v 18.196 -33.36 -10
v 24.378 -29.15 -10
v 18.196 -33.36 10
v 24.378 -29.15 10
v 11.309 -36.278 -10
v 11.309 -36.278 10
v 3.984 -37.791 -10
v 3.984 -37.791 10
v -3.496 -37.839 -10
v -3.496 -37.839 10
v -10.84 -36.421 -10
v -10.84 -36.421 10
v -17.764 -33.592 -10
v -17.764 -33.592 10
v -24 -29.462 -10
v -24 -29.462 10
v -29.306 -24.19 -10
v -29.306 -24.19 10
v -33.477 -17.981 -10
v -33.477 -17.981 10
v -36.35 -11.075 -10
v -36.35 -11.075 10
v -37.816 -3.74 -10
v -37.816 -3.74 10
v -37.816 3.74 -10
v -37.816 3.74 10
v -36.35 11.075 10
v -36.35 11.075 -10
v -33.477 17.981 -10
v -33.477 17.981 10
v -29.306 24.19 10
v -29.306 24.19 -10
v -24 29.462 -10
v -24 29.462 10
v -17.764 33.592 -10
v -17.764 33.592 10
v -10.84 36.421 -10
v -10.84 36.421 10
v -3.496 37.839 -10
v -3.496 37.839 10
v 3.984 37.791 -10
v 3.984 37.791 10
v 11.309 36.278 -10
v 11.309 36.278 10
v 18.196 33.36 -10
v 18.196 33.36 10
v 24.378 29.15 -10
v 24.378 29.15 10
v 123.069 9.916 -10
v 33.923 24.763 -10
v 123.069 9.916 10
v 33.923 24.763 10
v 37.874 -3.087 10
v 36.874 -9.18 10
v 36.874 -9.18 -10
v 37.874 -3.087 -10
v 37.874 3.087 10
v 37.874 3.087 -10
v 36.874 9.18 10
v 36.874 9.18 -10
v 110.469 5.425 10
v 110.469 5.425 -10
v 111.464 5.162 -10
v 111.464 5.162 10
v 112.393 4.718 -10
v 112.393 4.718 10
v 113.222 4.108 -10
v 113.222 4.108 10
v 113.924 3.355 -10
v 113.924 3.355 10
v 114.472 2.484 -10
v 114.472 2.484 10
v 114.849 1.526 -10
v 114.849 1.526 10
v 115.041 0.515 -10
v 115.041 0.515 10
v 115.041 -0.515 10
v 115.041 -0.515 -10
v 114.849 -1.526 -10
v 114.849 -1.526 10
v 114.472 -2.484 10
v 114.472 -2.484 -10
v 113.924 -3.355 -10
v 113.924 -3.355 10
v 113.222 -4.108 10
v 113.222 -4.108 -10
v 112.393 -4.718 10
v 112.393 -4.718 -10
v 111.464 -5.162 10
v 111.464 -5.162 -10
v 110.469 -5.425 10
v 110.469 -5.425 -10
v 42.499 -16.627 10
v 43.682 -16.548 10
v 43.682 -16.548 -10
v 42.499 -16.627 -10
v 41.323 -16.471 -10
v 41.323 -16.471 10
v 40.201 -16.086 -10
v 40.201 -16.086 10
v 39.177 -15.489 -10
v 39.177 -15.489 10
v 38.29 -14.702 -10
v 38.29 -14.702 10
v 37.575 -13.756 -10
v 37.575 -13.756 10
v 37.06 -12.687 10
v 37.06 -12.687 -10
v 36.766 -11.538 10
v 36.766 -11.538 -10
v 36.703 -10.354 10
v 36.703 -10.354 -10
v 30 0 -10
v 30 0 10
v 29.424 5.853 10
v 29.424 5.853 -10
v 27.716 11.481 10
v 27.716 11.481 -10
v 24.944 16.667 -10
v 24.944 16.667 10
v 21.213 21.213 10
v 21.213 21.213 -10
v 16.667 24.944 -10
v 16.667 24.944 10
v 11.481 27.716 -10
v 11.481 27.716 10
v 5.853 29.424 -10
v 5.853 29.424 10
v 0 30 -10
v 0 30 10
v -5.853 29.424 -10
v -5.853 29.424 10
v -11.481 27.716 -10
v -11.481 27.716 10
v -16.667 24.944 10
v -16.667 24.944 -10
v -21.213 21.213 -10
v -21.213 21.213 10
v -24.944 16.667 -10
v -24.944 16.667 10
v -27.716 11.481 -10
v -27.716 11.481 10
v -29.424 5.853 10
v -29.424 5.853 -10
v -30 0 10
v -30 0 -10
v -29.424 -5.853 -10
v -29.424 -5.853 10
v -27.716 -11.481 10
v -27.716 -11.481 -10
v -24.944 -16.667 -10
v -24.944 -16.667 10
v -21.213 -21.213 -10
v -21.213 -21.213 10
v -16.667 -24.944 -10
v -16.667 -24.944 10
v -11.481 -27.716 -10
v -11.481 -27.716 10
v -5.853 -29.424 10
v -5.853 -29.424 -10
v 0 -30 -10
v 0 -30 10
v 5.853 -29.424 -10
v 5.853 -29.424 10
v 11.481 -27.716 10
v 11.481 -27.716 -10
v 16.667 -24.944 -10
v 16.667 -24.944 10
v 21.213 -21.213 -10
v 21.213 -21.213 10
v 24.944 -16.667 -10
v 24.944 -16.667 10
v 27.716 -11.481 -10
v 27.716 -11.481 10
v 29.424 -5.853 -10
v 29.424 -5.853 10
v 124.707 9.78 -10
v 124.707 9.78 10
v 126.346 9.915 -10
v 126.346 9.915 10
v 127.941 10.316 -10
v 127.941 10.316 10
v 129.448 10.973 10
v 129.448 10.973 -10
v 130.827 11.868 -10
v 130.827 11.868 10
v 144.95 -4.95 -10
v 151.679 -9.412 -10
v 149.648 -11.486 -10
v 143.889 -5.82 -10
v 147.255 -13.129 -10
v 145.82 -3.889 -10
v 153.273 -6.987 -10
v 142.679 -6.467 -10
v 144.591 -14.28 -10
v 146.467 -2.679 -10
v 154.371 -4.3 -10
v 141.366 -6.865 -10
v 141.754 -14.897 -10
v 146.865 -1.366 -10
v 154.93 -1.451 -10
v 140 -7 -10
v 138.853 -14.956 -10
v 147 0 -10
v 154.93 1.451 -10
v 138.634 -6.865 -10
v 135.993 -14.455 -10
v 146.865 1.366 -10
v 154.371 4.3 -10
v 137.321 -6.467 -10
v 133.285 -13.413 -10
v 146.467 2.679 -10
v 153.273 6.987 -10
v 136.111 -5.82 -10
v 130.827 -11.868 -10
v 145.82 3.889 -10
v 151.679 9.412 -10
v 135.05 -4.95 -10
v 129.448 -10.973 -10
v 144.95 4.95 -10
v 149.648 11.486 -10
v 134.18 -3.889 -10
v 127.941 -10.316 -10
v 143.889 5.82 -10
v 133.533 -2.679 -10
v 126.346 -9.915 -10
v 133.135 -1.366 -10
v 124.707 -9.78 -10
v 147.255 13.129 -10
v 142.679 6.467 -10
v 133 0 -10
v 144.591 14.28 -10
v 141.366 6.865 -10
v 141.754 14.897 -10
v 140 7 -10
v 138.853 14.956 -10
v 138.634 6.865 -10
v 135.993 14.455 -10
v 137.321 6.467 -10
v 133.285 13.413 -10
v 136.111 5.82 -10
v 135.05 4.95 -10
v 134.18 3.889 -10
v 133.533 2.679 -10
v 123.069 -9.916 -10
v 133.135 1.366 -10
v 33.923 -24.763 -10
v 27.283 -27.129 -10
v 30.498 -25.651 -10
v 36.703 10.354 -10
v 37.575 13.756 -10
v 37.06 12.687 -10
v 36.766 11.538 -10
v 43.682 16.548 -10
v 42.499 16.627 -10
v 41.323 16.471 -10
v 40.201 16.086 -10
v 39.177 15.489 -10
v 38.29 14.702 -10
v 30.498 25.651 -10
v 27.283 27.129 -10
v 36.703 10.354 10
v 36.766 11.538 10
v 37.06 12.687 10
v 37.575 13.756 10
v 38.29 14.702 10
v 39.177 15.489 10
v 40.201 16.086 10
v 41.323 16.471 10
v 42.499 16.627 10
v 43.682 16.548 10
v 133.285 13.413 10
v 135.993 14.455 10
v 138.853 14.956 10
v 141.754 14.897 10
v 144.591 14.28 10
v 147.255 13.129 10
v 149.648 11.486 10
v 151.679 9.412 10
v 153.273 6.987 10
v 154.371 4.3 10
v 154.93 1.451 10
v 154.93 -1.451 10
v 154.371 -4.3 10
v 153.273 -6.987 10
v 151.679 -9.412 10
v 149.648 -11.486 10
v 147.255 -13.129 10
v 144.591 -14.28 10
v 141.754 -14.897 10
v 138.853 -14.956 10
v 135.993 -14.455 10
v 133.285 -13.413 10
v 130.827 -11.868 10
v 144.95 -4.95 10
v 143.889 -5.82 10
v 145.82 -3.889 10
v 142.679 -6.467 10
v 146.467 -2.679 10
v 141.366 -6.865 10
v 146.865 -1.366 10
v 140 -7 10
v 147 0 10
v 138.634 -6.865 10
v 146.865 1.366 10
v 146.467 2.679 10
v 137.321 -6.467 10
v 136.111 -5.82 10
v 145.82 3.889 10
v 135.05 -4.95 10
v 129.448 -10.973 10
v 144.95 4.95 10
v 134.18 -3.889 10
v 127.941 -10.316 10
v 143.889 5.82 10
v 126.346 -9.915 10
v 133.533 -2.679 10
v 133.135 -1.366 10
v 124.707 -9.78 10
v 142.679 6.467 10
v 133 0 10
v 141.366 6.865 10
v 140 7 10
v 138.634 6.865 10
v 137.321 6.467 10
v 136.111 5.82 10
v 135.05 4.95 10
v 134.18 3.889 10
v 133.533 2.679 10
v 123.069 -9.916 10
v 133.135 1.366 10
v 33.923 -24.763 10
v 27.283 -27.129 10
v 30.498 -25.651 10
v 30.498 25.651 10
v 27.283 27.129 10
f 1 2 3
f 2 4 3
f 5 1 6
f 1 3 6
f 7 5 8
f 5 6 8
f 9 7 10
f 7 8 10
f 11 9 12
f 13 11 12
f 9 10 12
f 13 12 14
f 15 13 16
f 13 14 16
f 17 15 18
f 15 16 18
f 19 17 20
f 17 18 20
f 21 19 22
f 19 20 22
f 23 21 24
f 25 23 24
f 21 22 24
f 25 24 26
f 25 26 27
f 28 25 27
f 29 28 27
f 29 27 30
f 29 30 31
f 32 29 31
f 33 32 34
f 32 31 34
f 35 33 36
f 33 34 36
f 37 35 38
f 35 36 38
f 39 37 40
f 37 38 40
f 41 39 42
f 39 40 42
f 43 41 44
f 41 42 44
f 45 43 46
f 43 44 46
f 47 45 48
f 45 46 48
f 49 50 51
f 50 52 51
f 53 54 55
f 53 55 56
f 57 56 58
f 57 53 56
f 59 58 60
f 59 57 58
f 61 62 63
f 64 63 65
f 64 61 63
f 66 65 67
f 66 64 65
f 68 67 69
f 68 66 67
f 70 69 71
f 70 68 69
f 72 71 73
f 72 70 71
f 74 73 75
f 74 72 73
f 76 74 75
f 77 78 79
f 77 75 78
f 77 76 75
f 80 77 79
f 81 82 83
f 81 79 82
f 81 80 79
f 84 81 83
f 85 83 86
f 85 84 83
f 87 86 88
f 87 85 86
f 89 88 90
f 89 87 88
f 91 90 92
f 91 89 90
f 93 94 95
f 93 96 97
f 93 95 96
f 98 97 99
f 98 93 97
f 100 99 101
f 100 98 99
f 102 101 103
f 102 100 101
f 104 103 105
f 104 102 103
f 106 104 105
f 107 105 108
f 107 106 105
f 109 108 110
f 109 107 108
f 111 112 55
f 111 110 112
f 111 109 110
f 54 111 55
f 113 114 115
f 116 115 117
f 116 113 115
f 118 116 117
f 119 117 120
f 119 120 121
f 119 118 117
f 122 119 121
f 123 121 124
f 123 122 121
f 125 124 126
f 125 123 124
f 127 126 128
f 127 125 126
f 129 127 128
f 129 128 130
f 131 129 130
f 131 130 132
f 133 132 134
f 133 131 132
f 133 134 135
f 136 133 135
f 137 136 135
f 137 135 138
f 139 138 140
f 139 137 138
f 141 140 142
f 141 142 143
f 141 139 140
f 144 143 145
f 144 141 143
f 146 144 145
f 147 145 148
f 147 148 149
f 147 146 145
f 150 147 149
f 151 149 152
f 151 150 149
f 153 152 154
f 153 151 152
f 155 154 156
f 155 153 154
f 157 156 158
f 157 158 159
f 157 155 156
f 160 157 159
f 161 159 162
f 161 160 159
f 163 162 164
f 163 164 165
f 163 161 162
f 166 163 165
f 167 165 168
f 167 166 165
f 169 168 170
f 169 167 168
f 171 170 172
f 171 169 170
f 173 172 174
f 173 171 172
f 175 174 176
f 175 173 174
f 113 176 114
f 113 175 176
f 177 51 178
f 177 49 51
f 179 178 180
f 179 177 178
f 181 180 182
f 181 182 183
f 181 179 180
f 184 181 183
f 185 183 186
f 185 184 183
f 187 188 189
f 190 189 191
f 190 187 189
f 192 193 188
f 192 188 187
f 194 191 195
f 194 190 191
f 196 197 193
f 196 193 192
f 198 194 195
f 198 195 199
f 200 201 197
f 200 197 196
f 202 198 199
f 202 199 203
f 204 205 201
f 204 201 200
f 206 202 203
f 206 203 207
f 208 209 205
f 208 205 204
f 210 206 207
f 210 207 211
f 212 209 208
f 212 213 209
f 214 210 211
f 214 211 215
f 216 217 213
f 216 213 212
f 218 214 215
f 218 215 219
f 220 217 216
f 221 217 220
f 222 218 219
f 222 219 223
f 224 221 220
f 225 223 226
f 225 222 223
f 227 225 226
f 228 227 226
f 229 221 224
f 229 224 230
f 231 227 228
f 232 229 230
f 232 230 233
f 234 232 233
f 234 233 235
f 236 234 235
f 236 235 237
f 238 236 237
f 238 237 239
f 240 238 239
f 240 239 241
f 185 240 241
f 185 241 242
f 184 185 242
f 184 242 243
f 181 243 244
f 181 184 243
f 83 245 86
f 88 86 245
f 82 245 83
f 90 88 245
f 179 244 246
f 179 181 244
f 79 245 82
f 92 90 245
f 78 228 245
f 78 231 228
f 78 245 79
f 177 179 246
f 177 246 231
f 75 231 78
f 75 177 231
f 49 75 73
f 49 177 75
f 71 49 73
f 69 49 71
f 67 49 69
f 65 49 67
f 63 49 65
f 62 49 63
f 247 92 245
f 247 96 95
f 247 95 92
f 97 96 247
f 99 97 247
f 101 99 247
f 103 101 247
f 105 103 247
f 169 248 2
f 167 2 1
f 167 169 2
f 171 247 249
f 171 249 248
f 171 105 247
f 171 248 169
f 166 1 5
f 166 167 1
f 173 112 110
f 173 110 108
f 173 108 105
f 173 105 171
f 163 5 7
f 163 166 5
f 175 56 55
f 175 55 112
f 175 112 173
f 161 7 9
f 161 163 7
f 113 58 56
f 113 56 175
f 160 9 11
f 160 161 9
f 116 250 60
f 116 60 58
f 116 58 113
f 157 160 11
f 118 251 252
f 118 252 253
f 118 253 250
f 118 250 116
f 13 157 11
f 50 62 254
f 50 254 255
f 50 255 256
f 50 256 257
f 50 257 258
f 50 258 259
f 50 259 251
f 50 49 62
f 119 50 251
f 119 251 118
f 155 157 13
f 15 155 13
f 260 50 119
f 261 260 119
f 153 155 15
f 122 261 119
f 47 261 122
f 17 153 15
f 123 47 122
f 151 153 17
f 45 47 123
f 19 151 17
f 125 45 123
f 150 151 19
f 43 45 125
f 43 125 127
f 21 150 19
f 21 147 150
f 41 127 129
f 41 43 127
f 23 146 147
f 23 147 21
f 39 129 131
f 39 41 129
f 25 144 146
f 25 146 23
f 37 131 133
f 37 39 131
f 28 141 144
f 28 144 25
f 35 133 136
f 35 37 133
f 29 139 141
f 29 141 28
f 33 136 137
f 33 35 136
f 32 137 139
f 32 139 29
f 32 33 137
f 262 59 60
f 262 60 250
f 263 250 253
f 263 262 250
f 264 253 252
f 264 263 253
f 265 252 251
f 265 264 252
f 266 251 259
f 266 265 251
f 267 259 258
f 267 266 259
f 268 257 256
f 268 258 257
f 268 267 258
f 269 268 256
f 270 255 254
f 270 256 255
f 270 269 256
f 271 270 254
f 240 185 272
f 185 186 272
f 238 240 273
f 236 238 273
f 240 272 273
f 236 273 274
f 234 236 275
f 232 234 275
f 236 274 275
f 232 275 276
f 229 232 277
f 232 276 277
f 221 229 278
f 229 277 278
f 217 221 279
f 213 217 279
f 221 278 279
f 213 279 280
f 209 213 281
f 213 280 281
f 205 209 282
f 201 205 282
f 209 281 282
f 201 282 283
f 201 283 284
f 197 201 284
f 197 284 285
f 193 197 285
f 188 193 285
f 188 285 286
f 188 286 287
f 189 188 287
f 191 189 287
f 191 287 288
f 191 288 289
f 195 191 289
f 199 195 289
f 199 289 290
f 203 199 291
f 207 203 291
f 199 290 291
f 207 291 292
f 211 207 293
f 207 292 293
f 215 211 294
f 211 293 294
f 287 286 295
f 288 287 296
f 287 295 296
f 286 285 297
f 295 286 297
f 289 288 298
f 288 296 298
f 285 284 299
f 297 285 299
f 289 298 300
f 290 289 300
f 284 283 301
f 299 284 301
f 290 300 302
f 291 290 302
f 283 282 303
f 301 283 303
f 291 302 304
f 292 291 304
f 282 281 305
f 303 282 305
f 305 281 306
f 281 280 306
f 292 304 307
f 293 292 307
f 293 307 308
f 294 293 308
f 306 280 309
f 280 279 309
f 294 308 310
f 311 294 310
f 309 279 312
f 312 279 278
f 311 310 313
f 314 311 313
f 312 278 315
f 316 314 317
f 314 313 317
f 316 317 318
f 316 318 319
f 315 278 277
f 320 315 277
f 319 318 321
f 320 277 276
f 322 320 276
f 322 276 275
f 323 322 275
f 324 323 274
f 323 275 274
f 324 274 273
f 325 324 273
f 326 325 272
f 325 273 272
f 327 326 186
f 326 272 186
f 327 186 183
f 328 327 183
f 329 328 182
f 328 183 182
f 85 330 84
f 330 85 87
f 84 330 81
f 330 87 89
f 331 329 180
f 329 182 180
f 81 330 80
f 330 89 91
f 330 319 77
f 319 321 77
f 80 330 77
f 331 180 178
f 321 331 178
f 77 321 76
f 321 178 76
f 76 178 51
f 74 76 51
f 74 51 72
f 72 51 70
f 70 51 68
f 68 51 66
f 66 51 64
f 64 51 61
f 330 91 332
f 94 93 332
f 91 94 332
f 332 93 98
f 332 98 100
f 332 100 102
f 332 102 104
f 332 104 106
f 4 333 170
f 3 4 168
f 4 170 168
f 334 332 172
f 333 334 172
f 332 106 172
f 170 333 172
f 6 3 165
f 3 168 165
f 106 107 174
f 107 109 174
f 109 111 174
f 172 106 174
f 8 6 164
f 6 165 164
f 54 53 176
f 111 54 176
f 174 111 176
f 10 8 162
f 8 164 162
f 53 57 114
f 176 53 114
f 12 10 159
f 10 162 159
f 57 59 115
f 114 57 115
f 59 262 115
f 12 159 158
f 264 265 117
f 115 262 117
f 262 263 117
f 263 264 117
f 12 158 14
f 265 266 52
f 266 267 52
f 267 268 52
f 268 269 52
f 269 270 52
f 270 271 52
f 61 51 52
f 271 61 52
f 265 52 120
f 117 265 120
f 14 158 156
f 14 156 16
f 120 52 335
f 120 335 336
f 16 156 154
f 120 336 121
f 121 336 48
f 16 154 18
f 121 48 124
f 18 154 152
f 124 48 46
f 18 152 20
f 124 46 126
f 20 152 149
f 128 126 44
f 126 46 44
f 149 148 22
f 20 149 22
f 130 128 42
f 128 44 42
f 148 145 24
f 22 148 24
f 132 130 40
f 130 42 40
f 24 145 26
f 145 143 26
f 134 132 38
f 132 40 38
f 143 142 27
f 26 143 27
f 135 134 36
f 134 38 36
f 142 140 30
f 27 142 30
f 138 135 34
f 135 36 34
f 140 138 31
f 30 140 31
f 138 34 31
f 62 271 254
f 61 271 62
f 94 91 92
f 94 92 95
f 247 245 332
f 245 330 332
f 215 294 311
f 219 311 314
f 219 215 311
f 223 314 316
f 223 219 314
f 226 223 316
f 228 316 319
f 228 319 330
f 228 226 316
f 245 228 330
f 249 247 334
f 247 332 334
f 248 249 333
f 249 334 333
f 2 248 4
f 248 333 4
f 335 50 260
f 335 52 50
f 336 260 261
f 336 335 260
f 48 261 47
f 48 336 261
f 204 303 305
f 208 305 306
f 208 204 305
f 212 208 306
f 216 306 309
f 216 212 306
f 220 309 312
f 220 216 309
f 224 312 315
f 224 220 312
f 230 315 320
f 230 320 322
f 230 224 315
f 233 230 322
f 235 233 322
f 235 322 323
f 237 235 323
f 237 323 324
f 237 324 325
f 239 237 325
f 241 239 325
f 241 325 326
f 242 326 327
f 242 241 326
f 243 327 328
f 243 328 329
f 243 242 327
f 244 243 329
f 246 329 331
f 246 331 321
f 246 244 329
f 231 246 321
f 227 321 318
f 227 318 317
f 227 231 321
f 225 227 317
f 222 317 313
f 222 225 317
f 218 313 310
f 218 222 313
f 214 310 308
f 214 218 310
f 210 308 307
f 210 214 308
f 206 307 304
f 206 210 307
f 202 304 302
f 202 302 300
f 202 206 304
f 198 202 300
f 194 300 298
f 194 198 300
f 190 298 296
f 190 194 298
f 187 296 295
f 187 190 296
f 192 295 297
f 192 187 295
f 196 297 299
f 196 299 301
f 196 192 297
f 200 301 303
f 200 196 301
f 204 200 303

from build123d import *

# Parameters (mm, degrees)
SKETCH1_R           = 30
SKETCH1_R_2         = 7
BOSS_EXTRUDE1_DEPTH = 10
FILLET1_R           = 20
FILLET2_R           = 10
CUT_EXTRUDE1_DEPTH  = 161.838428244


with BuildPart() as part:
    # Sketch1 → Boss-Extrude1 (new, symmetric)
    with BuildSketch(Plane.XY):
        with BuildLine():
            Line((27.935473676, 25.760615491), (128.063755469, 9.084385863))
            ThreePointArc((128.063755469, 9.084385863), (155, 0), (128.063755469, -9.084385863))
            Line((128.063755469, -9.084385863), (27.935473676, -25.760615491))
            ThreePointArc((27.935473676, -25.760615491), (-38, 0), (27.935473676, 25.760615491))
        make_face()
        Circle(SKETCH1_R, mode=Mode.SUBTRACT)
        with Locations((140, 0)):
            Circle(SKETCH1_R_2, mode=Mode.SUBTRACT)
    extrude(amount=BOSS_EXTRUDE1_DEPTH, both=True)

    # Fillet1
    fillet1_edges = [part.edges().sort_by_distance(p)[0] for p in [
        (27.935473676, 25.760615491, 0),
        (27.935473676, -25.760615491, 0),
    ]]
    fillet(fillet1_edges, radius=FILLET1_R)

    # Fillet2
    fillet2_edges = [part.edges().sort_by_distance(p)[0] for p in [
        (128.063755469, 9.084385863, 0),
        (128.063755469, -9.084385863, 0),
    ]]
    fillet(fillet2_edges, radius=FILLET2_R)

    # Sketch3 → Cut-Extrude1 (cut, through all)
    with BuildSketch(Plane.XY.offset(10)):
        with BuildLine():
            Line((43.682358904, 16.548459765), (110.46878882, 5.425270378))
            ThreePointArc((110.46878882, 5.425270378), (115.065217391, 0), (110.46878882, -5.425270378))
            Line((110.46878882, -5.425270378), (43.682358904, -16.548459765))
            ThreePointArc((43.682358904, -16.548459765), (38.289832111, -14.701838037), (36.874374898, -9.180439854))
            ThreePointArc((36.874374898, -9.180439854), (38, 0), (36.874374898, 9.180439854))
            ThreePointArc((36.874374898, 9.180439854), (38.289832111, 14.701838037), (43.682358904, 16.548459765))
        make_face()
    extrude(amount=-CUT_EXTRUDE1_DEPTH, mode=Mode.SUBTRACT)


solid = part.part
